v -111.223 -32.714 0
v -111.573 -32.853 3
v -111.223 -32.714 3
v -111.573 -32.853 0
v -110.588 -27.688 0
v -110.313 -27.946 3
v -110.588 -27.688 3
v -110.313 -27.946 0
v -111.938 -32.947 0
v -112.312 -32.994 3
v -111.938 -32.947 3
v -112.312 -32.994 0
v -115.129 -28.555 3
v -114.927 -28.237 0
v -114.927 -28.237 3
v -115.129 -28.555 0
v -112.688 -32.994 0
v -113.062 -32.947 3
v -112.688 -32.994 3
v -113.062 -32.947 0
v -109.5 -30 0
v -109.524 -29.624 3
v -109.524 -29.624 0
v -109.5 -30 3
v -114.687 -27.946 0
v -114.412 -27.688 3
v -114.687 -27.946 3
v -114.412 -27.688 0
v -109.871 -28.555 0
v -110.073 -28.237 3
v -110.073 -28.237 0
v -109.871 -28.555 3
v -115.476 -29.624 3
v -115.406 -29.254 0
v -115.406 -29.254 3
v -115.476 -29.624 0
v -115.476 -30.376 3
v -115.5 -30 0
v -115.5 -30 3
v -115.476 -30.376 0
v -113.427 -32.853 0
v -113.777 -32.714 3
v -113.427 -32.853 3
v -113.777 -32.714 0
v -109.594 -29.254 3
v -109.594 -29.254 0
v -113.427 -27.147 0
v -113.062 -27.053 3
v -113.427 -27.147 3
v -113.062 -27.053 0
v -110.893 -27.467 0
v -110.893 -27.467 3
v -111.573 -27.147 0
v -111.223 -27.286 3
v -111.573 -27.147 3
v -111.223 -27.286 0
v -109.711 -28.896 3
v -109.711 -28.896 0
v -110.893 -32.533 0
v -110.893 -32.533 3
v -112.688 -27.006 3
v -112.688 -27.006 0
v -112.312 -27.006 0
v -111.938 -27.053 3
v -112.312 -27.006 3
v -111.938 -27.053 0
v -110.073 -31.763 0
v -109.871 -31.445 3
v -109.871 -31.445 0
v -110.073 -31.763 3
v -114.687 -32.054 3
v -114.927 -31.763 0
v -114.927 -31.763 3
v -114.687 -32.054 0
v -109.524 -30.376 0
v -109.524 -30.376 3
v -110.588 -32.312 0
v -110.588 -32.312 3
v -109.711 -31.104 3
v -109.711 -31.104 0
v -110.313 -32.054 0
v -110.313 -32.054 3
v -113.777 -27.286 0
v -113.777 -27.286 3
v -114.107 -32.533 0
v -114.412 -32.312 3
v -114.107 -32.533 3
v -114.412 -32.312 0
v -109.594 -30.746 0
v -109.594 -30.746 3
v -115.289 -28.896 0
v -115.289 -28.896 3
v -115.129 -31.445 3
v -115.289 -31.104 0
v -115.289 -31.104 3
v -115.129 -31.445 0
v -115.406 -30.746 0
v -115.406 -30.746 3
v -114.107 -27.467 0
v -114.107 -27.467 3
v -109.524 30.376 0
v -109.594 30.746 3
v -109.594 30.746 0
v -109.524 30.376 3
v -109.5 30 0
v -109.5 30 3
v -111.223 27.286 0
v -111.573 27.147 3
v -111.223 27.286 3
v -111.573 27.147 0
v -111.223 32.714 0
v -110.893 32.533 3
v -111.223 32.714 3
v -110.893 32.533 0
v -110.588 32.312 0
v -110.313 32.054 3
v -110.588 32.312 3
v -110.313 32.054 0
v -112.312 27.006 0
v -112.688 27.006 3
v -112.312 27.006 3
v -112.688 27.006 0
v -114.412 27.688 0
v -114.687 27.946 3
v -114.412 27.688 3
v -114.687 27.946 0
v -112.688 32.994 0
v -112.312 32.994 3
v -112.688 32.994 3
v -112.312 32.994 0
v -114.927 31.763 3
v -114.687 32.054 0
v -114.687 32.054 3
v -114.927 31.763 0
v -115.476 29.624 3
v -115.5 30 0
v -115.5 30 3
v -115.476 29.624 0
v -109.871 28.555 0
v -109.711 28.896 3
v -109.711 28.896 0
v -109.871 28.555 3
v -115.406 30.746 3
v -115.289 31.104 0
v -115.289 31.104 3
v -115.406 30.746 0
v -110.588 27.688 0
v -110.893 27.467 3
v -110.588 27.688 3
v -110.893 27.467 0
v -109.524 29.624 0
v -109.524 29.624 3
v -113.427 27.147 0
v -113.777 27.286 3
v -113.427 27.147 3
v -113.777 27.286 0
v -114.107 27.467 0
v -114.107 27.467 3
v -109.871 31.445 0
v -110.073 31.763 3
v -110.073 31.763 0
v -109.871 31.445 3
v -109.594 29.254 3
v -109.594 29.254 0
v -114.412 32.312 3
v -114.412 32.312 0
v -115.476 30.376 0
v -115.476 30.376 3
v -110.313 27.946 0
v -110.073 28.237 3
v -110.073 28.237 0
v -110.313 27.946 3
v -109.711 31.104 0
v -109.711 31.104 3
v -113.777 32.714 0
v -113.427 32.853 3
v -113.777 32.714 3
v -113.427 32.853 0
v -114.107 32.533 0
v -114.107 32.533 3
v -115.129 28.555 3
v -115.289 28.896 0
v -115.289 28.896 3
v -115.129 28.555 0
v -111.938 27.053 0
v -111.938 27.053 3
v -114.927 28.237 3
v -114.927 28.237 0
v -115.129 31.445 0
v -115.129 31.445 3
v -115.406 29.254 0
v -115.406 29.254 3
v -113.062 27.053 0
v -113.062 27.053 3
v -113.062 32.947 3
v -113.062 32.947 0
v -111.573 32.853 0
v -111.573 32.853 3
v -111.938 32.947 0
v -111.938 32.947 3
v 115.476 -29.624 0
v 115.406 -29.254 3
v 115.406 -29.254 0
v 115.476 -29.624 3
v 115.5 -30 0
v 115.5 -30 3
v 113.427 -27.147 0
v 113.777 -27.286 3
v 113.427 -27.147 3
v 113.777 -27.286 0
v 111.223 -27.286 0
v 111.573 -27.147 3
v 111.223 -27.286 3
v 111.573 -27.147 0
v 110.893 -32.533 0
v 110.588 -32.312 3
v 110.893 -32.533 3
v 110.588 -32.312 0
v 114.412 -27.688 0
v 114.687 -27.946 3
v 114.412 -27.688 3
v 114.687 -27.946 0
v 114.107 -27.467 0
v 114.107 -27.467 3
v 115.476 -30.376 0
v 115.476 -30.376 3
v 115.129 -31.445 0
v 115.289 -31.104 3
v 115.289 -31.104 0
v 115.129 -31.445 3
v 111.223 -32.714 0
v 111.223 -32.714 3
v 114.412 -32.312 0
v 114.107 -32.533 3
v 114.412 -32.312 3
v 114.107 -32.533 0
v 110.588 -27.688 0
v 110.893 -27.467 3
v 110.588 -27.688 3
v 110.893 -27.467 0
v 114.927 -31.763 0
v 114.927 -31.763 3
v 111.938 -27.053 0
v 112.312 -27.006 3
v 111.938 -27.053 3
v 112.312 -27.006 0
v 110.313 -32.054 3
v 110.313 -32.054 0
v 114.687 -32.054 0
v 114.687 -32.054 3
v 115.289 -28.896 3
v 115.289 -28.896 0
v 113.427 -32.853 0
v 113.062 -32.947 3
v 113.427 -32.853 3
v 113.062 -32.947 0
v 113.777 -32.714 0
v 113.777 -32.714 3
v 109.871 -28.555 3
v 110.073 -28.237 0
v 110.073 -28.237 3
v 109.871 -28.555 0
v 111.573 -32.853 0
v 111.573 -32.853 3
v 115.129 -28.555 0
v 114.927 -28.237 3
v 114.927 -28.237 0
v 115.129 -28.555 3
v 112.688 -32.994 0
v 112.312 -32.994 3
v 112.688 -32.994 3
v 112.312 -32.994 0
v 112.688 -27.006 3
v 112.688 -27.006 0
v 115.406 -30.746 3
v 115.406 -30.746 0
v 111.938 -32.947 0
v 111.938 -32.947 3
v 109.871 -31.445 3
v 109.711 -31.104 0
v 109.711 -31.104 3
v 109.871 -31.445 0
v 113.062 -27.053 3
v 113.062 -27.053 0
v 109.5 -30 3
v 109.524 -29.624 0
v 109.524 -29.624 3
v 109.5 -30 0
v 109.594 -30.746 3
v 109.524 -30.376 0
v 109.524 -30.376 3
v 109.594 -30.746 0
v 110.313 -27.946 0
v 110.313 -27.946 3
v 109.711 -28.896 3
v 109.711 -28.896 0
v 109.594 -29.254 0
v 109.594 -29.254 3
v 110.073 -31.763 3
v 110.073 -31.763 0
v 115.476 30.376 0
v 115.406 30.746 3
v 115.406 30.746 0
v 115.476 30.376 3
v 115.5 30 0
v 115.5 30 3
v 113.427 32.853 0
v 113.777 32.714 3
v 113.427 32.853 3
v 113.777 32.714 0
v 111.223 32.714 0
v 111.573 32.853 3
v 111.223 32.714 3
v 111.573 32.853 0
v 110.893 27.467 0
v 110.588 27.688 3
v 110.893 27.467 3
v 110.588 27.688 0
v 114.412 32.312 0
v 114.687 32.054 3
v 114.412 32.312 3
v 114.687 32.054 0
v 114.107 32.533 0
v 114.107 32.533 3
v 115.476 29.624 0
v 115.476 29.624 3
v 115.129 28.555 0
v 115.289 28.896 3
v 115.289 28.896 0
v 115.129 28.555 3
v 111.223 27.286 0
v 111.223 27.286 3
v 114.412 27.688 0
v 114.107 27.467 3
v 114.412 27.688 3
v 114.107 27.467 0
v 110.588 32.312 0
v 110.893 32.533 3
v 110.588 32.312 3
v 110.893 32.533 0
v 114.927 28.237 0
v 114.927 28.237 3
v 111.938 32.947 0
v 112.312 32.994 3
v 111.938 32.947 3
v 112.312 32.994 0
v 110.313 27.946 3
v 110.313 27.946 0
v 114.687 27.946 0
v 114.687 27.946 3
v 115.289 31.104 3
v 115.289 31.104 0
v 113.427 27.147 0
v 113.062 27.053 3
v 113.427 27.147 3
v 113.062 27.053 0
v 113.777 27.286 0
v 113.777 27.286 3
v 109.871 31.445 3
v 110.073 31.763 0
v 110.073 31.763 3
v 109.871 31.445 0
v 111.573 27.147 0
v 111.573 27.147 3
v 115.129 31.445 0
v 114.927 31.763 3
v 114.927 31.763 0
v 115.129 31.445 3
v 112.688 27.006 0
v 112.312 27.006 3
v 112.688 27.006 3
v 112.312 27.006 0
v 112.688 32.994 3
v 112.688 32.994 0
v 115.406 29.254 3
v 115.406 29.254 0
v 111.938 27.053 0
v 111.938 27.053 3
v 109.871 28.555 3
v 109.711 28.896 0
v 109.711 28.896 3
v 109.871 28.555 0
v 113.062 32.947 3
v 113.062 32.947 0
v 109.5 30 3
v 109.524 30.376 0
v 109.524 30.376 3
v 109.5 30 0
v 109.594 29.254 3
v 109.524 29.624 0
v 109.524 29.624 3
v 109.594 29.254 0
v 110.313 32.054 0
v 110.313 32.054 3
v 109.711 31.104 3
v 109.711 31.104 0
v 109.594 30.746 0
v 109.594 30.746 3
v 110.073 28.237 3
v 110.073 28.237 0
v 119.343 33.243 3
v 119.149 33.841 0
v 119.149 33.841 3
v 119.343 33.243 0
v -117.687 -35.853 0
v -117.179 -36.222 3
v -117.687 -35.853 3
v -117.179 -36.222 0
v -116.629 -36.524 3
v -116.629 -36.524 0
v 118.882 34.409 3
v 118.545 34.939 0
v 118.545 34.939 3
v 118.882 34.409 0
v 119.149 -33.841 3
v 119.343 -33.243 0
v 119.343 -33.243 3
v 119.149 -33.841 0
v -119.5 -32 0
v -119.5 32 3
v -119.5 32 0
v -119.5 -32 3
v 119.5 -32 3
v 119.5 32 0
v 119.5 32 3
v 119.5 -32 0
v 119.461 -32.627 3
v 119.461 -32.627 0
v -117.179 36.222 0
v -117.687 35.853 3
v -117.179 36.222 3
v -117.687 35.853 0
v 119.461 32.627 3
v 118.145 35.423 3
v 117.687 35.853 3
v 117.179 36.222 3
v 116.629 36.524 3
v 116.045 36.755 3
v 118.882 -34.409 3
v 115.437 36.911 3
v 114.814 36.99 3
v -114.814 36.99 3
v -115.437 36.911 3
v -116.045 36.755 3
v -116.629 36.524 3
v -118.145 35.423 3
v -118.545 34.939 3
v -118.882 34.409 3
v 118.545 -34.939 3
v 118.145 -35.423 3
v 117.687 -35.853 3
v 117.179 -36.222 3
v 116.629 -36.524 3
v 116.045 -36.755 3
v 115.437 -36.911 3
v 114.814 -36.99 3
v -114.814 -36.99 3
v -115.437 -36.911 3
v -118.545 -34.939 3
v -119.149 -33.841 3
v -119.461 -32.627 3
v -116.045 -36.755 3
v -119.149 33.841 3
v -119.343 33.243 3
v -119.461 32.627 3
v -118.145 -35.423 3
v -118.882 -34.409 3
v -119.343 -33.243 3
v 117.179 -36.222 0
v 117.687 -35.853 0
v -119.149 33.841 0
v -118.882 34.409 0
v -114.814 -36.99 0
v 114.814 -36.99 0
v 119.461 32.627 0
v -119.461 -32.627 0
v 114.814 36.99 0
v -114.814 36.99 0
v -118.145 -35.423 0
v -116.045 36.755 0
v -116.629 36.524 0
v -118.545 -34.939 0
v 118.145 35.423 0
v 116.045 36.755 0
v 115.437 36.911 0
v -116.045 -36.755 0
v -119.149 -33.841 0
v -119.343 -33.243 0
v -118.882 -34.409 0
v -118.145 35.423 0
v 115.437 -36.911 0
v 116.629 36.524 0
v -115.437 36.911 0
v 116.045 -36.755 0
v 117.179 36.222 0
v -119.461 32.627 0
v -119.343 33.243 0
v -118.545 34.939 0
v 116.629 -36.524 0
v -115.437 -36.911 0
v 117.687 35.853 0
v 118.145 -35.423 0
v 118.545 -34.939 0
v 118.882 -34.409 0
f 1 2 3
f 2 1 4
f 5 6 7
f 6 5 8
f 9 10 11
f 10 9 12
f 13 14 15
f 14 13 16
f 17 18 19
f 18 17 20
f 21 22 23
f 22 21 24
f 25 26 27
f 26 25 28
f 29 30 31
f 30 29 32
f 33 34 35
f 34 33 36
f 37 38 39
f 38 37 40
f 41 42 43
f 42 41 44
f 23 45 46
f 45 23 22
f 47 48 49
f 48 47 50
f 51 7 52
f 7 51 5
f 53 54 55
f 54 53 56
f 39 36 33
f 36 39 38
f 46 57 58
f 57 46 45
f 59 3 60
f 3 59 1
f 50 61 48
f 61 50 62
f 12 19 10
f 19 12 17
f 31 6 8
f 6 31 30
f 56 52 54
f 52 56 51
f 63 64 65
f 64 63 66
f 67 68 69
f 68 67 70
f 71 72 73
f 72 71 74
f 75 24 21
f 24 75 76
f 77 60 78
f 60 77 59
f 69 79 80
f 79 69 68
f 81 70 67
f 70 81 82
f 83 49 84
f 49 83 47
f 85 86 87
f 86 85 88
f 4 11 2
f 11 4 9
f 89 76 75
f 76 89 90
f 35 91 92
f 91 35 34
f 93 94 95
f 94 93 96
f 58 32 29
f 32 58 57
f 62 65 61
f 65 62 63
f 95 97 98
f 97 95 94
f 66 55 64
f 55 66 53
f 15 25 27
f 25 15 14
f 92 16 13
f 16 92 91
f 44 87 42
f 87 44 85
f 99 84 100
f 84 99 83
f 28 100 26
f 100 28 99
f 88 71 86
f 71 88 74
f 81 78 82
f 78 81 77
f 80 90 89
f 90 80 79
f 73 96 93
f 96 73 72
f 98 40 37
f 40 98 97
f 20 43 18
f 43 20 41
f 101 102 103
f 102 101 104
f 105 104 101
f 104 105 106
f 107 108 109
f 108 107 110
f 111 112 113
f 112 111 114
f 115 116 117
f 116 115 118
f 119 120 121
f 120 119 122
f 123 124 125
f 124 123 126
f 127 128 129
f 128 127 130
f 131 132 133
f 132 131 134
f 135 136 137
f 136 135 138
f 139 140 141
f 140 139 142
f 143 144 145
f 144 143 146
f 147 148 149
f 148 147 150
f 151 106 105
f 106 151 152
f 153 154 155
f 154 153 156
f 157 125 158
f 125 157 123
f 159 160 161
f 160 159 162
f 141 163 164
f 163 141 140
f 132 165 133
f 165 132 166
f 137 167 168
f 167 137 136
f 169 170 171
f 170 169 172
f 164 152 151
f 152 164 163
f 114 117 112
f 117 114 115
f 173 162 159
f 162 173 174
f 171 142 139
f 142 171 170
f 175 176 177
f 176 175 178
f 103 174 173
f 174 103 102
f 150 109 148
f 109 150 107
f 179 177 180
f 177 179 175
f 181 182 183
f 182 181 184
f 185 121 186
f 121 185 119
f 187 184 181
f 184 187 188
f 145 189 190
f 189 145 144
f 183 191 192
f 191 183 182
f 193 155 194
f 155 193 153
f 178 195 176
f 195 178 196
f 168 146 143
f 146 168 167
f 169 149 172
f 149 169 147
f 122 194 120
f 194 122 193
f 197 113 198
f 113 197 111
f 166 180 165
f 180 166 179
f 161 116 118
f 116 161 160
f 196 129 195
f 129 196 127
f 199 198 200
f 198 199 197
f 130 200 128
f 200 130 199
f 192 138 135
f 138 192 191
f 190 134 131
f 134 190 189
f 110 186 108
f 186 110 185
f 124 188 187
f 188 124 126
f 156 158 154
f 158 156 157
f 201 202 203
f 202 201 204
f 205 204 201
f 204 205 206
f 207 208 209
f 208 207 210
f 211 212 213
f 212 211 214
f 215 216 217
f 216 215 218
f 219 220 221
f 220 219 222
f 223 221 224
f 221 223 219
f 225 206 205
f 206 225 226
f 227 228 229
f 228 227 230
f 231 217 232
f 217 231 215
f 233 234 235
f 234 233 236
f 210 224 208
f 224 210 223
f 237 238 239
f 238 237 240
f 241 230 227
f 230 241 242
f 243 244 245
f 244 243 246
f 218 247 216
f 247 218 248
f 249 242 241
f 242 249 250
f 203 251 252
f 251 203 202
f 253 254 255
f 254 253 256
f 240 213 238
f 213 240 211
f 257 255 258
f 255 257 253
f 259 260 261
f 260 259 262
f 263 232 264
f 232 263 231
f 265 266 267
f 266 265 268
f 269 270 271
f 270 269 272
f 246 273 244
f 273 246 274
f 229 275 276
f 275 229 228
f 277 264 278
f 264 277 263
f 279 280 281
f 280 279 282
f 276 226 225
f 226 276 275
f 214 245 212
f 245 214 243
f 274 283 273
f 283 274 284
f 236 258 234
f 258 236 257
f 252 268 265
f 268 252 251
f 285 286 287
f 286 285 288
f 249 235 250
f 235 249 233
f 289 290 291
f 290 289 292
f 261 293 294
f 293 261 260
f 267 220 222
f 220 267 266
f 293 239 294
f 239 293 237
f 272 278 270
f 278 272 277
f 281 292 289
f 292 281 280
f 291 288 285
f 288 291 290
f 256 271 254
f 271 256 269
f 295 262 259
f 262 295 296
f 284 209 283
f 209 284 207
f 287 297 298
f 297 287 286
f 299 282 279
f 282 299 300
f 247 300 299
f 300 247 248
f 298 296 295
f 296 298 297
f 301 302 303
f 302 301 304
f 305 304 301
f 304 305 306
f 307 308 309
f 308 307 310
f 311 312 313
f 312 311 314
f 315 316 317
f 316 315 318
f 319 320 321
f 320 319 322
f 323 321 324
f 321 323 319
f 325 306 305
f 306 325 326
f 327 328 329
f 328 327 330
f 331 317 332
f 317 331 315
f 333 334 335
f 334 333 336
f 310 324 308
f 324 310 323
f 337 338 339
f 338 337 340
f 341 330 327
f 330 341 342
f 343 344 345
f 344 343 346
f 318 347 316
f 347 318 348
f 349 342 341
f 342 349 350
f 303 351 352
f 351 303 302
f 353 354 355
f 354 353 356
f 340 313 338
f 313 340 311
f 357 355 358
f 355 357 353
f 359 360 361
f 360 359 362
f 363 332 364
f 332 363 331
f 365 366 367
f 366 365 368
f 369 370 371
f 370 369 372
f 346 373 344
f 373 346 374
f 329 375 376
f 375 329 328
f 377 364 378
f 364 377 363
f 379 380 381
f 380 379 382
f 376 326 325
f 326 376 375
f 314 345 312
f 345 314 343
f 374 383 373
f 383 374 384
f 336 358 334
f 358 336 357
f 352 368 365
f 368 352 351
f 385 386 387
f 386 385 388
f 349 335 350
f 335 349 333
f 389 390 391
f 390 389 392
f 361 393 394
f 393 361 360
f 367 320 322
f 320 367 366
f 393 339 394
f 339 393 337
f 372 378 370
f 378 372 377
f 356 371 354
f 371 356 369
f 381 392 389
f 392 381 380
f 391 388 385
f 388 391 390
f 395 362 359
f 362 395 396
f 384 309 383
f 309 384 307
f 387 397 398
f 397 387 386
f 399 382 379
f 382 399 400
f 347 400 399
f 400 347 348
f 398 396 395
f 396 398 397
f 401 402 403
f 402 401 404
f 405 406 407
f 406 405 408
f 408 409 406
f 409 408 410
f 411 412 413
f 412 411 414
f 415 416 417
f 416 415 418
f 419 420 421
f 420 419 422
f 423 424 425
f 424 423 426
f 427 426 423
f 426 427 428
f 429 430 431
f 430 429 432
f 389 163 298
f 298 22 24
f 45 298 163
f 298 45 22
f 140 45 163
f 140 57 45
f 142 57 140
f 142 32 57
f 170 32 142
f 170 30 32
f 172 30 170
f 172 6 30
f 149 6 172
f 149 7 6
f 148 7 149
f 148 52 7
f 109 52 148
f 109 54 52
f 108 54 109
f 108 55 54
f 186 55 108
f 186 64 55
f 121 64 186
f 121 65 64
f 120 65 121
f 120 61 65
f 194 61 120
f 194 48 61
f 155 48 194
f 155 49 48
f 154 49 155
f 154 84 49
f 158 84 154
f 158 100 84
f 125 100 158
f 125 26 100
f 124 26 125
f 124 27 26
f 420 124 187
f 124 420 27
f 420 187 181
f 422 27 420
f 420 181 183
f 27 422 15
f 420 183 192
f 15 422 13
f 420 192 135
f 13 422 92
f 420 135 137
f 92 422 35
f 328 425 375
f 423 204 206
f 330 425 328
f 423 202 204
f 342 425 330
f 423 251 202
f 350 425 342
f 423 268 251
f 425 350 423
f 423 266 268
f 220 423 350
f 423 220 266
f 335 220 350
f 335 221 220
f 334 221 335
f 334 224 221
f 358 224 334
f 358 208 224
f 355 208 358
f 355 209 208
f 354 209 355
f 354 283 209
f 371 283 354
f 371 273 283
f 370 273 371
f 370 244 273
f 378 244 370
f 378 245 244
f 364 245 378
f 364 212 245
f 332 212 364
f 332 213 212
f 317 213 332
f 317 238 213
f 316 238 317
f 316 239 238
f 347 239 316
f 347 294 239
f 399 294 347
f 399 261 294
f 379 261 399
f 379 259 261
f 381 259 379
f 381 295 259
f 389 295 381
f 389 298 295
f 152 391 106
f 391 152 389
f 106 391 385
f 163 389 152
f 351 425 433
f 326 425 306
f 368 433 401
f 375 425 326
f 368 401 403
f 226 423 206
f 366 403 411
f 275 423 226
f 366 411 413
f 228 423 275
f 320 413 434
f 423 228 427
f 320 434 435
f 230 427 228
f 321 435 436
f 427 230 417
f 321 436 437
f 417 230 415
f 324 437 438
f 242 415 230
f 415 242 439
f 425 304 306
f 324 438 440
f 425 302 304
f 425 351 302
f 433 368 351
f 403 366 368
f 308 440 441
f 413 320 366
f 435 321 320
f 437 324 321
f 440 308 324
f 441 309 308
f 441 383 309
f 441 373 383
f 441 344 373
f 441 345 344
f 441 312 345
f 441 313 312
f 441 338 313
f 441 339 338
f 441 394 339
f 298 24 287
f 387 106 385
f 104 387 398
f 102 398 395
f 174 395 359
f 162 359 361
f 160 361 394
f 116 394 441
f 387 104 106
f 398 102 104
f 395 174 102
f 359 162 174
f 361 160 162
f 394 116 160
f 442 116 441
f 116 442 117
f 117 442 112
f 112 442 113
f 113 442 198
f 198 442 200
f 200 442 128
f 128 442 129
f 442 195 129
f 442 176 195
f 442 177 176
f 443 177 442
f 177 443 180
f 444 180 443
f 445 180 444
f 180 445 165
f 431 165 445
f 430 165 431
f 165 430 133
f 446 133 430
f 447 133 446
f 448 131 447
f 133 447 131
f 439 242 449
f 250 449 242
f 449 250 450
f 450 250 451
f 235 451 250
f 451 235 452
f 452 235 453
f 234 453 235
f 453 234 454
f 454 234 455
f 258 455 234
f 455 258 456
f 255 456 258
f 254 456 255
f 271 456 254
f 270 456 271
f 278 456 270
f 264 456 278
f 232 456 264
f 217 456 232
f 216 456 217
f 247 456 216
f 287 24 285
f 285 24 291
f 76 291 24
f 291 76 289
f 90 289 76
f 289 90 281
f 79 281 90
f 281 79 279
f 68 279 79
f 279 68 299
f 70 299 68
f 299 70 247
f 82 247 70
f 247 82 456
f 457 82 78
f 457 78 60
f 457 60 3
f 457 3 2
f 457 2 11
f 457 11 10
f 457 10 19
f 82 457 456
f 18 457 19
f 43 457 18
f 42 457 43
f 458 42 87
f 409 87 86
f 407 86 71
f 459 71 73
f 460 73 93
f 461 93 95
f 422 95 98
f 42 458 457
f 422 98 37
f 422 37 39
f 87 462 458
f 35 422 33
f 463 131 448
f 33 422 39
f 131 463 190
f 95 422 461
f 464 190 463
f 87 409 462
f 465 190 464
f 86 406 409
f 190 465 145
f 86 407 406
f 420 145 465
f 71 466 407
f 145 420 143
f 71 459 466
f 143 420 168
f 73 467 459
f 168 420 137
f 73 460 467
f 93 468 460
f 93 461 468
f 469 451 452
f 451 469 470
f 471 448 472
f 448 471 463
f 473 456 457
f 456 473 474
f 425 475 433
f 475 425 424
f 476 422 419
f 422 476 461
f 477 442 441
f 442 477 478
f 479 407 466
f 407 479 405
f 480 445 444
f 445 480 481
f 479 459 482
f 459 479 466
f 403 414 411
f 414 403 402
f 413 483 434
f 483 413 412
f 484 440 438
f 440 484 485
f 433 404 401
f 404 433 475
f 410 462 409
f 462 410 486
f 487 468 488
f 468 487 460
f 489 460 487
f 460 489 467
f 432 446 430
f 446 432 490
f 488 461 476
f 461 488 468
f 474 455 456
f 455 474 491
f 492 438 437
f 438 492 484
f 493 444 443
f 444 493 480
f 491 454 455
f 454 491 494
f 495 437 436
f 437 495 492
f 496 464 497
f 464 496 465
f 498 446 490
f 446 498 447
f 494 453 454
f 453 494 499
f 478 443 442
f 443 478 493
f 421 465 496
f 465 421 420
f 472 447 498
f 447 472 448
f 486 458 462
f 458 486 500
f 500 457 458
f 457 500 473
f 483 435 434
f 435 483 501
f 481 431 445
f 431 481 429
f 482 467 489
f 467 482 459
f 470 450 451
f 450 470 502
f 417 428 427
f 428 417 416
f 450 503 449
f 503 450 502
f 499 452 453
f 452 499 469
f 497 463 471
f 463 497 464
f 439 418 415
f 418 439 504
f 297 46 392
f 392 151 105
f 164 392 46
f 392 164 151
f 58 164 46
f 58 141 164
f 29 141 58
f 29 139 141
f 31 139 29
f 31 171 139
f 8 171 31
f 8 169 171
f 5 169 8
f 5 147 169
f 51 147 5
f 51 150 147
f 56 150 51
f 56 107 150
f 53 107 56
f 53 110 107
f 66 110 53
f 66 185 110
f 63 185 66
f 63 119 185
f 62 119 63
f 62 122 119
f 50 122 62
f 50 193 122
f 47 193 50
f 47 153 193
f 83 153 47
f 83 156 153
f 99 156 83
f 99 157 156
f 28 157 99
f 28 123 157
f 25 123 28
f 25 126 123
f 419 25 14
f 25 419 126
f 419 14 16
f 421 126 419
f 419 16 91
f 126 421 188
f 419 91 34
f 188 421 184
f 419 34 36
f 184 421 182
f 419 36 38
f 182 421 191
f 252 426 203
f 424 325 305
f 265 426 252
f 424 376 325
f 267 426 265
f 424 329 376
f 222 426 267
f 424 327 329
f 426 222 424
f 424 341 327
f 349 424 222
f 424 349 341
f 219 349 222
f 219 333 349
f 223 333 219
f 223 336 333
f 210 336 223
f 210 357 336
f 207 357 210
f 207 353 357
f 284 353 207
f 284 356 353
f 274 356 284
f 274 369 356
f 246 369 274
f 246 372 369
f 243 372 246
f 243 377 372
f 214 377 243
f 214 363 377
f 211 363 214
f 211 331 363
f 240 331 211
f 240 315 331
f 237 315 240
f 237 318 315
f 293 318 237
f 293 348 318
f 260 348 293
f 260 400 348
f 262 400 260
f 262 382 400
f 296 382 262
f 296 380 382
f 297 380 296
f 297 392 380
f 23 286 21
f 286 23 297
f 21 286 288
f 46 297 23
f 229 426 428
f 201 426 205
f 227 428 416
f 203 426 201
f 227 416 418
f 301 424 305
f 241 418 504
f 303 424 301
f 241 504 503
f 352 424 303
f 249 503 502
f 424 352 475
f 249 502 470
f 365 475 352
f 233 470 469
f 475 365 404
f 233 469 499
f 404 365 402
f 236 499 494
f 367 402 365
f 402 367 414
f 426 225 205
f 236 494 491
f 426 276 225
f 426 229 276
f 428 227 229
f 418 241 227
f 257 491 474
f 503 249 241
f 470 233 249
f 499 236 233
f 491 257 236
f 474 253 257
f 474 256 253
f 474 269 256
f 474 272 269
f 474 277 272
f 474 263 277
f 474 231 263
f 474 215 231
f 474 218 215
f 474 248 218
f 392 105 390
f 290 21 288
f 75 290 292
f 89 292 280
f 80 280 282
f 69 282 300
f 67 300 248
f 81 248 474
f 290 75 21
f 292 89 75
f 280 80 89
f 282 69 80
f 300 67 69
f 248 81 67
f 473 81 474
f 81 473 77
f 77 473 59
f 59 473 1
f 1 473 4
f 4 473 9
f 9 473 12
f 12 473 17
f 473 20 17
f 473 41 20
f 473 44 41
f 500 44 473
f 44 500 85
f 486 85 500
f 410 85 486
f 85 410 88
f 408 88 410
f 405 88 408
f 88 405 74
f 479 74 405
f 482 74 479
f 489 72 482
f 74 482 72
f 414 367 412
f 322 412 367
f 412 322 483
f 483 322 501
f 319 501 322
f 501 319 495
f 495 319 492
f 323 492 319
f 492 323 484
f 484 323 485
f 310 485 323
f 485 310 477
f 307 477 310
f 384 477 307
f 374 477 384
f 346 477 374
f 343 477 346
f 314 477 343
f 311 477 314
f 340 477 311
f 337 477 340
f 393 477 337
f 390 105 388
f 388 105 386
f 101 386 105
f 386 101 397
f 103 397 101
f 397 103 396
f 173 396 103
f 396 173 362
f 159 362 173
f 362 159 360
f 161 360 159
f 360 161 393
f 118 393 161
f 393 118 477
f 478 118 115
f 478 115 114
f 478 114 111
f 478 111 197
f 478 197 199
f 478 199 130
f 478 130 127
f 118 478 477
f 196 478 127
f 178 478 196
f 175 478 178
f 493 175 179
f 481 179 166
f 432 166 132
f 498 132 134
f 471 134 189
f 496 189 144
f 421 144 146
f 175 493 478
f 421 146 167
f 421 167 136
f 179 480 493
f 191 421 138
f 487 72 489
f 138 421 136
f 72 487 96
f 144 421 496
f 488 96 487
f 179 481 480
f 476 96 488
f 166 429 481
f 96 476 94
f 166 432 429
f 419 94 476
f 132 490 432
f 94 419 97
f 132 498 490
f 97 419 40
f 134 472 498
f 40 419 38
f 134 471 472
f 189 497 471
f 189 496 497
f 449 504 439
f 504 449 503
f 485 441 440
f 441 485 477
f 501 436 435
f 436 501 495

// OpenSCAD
$fn = 50;


difference() {
	union() {
		hull() {
			translate(v = [-114.5000000000, 32.0000000000, 0]) {
				cylinder(h = 3, r = 5);
			}
			translate(v = [114.5000000000, 32.0000000000, 0]) {
				cylinder(h = 3, r = 5);
			}
			translate(v = [-114.5000000000, -32.0000000000, 0]) {
				cylinder(h = 3, r = 5);
			}
			translate(v = [114.5000000000, -32.0000000000, 0]) {
				cylinder(h = 3, r = 5);
			}
		}
	}
	union() {
		translate(v = [-112.5000000000, -30.0000000000, -100.0000000000]) {
			cylinder(h = 200, r = 3.0000000000);
		}
		translate(v = [-112.5000000000, 30.0000000000, -100.0000000000]) {
			cylinder(h = 200, r = 3.0000000000);
		}
		translate(v = [112.5000000000, -30.0000000000, -100.0000000000]) {
			cylinder(h = 200, r = 3.0000000000);
		}
		translate(v = [112.5000000000, 30.0000000000, -100.0000000000]) {
			cylinder(h = 200, r = 3.0000000000);
		}
	}
}
